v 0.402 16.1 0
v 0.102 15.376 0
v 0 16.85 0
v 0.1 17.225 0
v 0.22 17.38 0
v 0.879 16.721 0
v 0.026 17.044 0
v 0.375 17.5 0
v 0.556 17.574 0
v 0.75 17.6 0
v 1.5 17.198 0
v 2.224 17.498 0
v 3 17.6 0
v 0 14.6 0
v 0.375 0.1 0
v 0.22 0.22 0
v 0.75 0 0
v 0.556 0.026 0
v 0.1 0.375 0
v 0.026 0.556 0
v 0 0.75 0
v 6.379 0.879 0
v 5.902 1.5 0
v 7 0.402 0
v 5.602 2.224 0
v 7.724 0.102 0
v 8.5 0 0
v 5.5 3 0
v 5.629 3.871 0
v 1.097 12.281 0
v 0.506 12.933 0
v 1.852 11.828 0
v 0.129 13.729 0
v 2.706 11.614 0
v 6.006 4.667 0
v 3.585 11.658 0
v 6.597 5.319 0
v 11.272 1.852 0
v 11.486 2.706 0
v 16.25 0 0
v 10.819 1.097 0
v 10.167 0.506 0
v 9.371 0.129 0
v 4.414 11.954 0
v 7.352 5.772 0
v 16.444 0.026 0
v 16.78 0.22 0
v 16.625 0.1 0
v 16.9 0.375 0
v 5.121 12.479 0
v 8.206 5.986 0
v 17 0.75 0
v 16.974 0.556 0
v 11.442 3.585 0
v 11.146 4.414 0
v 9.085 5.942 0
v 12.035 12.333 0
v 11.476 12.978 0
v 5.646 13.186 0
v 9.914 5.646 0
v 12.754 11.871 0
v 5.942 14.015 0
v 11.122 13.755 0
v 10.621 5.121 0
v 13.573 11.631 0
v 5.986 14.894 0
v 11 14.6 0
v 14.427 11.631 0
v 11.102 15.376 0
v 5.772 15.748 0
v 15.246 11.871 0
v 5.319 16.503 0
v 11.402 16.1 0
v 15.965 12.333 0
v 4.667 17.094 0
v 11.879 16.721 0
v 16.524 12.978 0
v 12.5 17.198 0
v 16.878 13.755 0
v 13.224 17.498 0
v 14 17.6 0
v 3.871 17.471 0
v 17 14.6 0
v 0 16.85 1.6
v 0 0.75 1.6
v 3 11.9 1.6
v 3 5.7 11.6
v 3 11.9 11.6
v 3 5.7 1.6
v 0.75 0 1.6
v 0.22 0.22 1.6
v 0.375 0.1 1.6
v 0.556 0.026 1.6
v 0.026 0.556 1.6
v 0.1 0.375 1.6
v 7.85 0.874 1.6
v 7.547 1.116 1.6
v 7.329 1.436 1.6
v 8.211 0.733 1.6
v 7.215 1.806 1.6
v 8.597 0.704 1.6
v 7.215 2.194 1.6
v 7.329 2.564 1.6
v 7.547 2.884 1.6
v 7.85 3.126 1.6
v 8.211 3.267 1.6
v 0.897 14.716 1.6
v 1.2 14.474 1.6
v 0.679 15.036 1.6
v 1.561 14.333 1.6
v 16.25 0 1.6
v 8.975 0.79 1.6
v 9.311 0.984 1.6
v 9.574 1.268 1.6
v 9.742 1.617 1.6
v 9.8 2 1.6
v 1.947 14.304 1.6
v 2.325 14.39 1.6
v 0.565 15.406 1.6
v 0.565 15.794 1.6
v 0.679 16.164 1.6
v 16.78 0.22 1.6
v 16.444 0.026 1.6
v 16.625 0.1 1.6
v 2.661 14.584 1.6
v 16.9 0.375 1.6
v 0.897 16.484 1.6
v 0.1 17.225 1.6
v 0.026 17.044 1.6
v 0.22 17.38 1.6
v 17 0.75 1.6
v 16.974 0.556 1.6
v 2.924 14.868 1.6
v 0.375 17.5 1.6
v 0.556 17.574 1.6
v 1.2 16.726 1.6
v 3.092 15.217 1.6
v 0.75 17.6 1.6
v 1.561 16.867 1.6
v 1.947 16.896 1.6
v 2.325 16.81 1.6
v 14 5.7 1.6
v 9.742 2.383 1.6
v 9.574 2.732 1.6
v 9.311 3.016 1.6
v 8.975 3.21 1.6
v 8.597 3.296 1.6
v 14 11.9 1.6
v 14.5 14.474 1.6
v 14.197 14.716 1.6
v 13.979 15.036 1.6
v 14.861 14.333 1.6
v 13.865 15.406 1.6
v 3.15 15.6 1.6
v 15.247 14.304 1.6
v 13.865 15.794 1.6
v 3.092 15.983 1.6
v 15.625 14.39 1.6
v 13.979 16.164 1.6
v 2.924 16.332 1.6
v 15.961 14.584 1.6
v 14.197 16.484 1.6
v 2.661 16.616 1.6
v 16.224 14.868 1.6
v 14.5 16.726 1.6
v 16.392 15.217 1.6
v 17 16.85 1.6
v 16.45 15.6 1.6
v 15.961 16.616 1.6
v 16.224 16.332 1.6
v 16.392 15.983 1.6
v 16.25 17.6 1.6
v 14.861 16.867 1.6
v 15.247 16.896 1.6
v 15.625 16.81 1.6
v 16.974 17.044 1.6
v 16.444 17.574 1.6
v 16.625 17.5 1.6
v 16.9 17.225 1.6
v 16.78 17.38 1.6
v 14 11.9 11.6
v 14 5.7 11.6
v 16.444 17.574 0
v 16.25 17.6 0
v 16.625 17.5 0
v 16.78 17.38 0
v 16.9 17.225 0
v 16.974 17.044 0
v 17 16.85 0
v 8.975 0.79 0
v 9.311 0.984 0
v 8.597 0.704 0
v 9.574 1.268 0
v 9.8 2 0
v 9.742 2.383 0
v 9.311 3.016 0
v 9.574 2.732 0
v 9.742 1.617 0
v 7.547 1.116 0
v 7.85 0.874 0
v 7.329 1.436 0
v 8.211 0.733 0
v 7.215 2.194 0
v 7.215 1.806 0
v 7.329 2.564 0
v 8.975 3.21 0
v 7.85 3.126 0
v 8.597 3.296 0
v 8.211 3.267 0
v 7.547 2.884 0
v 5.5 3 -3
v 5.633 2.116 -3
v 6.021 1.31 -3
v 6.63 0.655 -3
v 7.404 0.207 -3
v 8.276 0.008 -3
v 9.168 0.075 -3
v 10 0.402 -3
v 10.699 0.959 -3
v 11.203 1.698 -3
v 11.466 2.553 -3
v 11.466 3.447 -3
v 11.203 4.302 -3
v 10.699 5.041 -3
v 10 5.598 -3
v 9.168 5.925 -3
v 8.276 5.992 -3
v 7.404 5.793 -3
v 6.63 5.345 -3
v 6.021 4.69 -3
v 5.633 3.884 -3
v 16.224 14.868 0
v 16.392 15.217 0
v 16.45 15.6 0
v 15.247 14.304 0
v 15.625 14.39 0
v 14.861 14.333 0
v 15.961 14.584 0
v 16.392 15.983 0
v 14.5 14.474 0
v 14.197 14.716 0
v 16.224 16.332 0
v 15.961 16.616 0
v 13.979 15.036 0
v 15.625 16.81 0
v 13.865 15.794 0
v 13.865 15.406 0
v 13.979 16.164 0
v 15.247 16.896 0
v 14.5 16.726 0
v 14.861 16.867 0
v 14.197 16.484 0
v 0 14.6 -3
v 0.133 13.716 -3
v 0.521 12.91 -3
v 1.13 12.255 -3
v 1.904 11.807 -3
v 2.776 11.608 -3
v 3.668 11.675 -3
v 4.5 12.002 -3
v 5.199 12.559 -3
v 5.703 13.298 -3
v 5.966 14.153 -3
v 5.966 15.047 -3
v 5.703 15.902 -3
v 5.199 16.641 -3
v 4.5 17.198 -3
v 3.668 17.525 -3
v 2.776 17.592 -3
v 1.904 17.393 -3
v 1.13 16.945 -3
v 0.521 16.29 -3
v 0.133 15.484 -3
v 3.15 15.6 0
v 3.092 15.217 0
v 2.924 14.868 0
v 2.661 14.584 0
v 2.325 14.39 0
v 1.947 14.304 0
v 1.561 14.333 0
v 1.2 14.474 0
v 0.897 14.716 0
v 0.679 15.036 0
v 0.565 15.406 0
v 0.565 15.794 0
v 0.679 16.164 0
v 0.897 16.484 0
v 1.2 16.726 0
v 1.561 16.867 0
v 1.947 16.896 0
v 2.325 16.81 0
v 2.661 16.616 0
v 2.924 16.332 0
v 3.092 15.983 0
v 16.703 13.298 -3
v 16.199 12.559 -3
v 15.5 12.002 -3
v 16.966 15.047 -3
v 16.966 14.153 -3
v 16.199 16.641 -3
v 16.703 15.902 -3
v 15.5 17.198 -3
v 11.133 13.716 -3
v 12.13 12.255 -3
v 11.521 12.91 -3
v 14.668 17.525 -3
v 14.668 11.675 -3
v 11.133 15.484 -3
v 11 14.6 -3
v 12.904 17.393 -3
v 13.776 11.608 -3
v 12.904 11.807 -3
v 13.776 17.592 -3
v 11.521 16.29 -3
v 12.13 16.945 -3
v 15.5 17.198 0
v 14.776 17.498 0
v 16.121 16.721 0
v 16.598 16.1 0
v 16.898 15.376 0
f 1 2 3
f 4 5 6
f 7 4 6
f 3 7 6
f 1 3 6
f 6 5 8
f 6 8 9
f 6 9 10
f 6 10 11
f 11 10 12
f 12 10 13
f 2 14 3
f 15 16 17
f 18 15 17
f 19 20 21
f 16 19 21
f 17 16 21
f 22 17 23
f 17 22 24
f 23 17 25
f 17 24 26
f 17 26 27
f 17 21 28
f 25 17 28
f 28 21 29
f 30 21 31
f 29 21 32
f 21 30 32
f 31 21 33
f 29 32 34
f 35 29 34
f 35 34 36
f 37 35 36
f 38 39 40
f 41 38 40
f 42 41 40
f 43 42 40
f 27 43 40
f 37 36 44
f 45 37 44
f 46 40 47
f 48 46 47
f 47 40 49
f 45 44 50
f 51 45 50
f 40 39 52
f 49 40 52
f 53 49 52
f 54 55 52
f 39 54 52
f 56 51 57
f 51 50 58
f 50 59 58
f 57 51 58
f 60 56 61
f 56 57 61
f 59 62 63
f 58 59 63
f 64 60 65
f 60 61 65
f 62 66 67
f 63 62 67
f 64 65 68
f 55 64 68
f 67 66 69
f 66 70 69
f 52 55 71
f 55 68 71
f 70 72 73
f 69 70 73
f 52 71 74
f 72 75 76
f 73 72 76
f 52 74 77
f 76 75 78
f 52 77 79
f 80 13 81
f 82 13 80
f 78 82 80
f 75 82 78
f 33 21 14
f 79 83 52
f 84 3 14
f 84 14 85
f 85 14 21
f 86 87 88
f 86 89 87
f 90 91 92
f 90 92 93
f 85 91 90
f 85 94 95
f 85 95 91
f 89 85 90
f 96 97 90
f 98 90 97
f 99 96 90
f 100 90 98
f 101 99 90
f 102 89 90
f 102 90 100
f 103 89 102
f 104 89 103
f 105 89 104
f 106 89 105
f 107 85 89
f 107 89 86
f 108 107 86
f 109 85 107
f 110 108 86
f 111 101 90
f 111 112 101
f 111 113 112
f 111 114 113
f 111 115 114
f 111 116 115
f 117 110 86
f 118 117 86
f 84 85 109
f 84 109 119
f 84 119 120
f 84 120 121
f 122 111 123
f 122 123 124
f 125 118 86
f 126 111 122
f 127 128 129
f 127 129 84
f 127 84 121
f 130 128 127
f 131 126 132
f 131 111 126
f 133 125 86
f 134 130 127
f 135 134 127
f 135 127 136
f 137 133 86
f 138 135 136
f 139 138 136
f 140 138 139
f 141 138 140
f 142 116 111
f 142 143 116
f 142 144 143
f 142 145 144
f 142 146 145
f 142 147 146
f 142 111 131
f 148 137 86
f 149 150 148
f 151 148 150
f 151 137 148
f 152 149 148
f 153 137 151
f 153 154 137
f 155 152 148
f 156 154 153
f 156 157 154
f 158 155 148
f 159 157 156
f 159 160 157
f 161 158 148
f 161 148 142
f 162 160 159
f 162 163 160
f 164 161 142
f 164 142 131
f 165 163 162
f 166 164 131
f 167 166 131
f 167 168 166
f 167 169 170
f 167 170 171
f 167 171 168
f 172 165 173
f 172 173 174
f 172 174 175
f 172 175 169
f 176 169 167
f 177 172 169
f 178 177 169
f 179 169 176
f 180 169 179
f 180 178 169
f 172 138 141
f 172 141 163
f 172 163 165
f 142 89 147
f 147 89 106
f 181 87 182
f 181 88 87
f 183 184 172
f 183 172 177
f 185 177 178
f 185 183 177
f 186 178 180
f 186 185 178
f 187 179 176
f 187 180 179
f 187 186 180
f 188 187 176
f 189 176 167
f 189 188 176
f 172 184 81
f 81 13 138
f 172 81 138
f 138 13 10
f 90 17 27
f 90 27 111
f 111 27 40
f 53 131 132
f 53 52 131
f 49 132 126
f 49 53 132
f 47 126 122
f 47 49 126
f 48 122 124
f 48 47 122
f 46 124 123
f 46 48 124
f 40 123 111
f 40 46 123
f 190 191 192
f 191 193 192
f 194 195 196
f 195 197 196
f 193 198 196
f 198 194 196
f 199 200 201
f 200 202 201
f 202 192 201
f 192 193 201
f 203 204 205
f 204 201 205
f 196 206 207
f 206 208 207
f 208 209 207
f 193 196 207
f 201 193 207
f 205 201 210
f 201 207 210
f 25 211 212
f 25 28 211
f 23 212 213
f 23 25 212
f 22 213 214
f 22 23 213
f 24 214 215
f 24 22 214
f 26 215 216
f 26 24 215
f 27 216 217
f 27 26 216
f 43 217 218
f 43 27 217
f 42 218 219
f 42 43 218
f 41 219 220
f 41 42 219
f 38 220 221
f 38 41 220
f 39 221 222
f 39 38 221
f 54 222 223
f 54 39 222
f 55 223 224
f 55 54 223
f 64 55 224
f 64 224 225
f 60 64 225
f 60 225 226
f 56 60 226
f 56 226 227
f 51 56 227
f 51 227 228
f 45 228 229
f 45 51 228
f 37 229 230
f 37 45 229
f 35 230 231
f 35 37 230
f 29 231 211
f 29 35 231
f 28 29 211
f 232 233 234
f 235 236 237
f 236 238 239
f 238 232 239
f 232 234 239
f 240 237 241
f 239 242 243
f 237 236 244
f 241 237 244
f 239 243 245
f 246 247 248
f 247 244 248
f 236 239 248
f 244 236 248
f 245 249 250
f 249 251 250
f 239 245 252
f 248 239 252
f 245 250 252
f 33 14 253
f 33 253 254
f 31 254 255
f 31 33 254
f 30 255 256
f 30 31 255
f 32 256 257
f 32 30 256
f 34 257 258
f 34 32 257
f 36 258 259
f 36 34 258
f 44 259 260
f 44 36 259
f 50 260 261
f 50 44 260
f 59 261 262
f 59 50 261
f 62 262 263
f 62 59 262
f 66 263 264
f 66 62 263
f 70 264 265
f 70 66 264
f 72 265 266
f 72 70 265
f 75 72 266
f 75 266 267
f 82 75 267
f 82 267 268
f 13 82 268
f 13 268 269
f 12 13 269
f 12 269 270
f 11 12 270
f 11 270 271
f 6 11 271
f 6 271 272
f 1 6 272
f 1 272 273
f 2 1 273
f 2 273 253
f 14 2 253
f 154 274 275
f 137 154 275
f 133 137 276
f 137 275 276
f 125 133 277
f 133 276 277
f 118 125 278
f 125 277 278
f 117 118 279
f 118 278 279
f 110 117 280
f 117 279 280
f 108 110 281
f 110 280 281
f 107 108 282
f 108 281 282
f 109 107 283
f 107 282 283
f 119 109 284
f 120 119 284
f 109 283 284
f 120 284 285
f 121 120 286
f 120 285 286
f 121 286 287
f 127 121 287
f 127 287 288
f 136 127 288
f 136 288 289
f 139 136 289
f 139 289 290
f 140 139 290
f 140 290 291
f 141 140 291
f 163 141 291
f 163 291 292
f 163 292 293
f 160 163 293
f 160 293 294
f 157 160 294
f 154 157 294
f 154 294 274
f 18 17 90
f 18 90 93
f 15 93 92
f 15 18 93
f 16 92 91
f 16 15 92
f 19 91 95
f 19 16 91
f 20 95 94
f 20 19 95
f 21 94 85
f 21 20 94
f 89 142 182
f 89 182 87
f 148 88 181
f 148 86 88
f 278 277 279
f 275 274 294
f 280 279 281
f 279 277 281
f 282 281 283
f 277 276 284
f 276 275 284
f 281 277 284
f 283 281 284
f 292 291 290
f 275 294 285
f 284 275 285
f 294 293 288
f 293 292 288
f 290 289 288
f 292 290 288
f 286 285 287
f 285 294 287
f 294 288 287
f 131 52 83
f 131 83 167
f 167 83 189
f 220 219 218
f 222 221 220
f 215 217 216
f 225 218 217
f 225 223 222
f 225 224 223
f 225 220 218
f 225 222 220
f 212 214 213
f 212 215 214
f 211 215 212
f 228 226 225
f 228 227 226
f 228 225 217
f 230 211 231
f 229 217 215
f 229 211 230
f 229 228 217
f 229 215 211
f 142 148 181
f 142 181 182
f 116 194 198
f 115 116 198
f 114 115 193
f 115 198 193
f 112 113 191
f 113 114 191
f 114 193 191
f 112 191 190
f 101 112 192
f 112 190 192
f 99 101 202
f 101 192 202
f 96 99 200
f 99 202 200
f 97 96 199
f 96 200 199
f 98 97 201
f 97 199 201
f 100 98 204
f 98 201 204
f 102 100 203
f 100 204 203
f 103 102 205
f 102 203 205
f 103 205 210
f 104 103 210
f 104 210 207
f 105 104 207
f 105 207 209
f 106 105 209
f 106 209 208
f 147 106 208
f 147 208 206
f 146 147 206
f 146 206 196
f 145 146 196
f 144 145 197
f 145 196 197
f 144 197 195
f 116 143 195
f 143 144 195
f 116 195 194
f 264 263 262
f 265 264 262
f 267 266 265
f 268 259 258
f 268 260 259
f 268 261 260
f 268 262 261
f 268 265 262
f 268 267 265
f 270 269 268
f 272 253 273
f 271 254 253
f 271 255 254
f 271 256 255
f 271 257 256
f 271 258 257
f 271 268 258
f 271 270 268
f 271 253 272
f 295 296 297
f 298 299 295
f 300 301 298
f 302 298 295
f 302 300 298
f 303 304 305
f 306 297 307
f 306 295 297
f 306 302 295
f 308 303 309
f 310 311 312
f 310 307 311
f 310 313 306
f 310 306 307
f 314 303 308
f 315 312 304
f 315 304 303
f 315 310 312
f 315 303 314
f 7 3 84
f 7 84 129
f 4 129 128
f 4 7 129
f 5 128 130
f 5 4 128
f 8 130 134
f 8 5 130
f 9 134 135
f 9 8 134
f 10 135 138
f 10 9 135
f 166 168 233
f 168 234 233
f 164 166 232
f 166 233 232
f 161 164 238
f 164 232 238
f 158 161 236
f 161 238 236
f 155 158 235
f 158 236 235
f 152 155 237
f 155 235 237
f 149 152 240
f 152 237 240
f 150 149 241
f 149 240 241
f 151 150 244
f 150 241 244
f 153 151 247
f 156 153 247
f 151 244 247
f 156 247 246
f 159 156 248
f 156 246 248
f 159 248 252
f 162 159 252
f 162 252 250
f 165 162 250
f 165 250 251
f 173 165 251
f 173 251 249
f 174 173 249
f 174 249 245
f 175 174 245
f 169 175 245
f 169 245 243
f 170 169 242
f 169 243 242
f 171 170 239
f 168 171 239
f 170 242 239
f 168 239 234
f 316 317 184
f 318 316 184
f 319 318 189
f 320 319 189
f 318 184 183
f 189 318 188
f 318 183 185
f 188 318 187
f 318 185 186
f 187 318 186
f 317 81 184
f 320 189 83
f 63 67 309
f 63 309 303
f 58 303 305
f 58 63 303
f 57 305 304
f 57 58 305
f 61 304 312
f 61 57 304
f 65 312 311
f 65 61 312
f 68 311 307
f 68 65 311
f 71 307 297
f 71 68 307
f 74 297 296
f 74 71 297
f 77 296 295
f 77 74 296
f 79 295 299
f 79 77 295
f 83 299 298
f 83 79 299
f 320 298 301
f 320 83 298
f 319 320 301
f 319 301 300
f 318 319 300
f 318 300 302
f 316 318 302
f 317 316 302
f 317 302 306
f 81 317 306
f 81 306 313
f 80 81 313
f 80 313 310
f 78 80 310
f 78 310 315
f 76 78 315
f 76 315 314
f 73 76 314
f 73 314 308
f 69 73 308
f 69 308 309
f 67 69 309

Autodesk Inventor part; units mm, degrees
ref_plane "YZ Plane" through (0, 0, 0) normal (1, 0, 0) x (0, 1, 0)
ref_plane "XZ Plane" through (0, 0, 0) normal (0, 1, 0) x (-1, 0, 0)
ref_plane "XY Plane" through (0, 0, 0) normal (0, 0, 1) x (1, 0, 0)
sketch "Sketch1" plane through (0, 0, 0) normal (0, 0, 1) x (1, 0, 0)
  line L0 (0, 0) -> (17, 0)
  line L1 (17, 0) -> (17, 17.6)
  line L2 (17, 17.6) -> (0, 17.6)
  line L3 (0, 17.6) -> (0, 0)
  circle A0 centre (16.25, 16.85) radius 0.75
  circle A1 centre (0.75, 16.85) radius 0.75
  circle A2 centre (0.75, 0.75) radius 0.75
  circle A3 centre (16.25, 0.75) radius 0.75
  circle A4 centre (1.85, 15.6) radius 1.3
  circle A5 centre (15.15, 15.6) radius 1.3
  circle A6 centre (8.5, 2) radius 1.3
  point P0 (0, 16.85)
  point P1 (0, 0.75)
  point P2 (0.75, 0)
  point P3 (16.25, 0)
  point P4 (17, 0.75)
  point P5 (17, 16.85)
  point P6 (16.25, 17.6)
  point P7 (0.75, 17.6)
  dimension "d0" = 17
  dimension "d1" = 17.6
  dimension "d2" = 1.5
  dimension "d3" = 1.5
  dimension "d4" = 1.5
  dimension "d5" = 1.5
  dimension "d7" = 2.6
  dimension "d11" = 1.85
  dimension "d12" = 1.85
  dimension "d13" = 2
  dimension "d14" = 2.6
  dimension "d15" = 2
  dimension "d16" = 8.5
extrude "Extrusion1" add sketch "Sketch1" along normal blind 1.6 contours A2 L3 A1 A4 L2 A0 A5 L1 A3 L0 | A2 | A3 | A1 A4 | A0 A5 picked at (1.0458, 16.9665) picked at (15.9541, 16.9666)
sketch "Sketch2" plane through (0, 0, 1.6) normal (0, 0, 1) x (1, 0, 0)
  line L0 (3, 11.9) -> (14, 11.9)
  line L1 (14, 11.9) -> (14, 5.7)
  line L2 (14, 5.7) -> (3, 5.7)
  line L3 (3, 5.7) -> (3, 11.9)
  line L4 (3, 11.9) -> (14, 5.7) construction
  line L5 (14, 11.9) -> (3, 5.7) construction
  line L6 (0, 16.85) -> (0, 0.75) projected
  line L7 (16.25, 17.6) -> (0.75, 17.6) projected
  point P0 (0, 0)
  point P1 (8.5, 8.8)
  point P2 (0, 8.8)
  point P3 (8.5, 17.6)
  point P4 (0, 8.8)
  point P5 (8.5, 5.7)
  dimension "d19" = 11
  dimension "d20" = 6.2
extrude "Extrusion2" add sketch "Sketch2" along normal blind 10
sketch "Sketch3" plane through (0, 0, 0) normal (0, 0, -1) x (-1, 0, 0)
  circle A0 centre (-14, 14.6) radius 3
  circle A1 centre (-3, 14.6) radius 3
  circle A2 centre (-8.5, 3) radius 3
  circle A3 centre (-8.5, 2) radius 1.3 projected
  line L0 (-0.75, 0) -> (-16.25, 0) projected
  line L1 (-16.25, 17.6) -> (-0.75, 17.6) projected
  line L2 (-17, 0.75) -> (-17, 16.85) projected
  line L3 (0, 16.85) -> (0, 0.75) projected
  point P0 (0, 0)
  dimension "d23" = 6
  dimension "d24" = 6
  dimension "d25" = 6
extrude "Extrusion3" add sketch "Sketch3" along normal blind 3 contours A0 | A1 | A2 | A3
equation "\"d12\" = d11"
properties part number "clicky pcb top"
